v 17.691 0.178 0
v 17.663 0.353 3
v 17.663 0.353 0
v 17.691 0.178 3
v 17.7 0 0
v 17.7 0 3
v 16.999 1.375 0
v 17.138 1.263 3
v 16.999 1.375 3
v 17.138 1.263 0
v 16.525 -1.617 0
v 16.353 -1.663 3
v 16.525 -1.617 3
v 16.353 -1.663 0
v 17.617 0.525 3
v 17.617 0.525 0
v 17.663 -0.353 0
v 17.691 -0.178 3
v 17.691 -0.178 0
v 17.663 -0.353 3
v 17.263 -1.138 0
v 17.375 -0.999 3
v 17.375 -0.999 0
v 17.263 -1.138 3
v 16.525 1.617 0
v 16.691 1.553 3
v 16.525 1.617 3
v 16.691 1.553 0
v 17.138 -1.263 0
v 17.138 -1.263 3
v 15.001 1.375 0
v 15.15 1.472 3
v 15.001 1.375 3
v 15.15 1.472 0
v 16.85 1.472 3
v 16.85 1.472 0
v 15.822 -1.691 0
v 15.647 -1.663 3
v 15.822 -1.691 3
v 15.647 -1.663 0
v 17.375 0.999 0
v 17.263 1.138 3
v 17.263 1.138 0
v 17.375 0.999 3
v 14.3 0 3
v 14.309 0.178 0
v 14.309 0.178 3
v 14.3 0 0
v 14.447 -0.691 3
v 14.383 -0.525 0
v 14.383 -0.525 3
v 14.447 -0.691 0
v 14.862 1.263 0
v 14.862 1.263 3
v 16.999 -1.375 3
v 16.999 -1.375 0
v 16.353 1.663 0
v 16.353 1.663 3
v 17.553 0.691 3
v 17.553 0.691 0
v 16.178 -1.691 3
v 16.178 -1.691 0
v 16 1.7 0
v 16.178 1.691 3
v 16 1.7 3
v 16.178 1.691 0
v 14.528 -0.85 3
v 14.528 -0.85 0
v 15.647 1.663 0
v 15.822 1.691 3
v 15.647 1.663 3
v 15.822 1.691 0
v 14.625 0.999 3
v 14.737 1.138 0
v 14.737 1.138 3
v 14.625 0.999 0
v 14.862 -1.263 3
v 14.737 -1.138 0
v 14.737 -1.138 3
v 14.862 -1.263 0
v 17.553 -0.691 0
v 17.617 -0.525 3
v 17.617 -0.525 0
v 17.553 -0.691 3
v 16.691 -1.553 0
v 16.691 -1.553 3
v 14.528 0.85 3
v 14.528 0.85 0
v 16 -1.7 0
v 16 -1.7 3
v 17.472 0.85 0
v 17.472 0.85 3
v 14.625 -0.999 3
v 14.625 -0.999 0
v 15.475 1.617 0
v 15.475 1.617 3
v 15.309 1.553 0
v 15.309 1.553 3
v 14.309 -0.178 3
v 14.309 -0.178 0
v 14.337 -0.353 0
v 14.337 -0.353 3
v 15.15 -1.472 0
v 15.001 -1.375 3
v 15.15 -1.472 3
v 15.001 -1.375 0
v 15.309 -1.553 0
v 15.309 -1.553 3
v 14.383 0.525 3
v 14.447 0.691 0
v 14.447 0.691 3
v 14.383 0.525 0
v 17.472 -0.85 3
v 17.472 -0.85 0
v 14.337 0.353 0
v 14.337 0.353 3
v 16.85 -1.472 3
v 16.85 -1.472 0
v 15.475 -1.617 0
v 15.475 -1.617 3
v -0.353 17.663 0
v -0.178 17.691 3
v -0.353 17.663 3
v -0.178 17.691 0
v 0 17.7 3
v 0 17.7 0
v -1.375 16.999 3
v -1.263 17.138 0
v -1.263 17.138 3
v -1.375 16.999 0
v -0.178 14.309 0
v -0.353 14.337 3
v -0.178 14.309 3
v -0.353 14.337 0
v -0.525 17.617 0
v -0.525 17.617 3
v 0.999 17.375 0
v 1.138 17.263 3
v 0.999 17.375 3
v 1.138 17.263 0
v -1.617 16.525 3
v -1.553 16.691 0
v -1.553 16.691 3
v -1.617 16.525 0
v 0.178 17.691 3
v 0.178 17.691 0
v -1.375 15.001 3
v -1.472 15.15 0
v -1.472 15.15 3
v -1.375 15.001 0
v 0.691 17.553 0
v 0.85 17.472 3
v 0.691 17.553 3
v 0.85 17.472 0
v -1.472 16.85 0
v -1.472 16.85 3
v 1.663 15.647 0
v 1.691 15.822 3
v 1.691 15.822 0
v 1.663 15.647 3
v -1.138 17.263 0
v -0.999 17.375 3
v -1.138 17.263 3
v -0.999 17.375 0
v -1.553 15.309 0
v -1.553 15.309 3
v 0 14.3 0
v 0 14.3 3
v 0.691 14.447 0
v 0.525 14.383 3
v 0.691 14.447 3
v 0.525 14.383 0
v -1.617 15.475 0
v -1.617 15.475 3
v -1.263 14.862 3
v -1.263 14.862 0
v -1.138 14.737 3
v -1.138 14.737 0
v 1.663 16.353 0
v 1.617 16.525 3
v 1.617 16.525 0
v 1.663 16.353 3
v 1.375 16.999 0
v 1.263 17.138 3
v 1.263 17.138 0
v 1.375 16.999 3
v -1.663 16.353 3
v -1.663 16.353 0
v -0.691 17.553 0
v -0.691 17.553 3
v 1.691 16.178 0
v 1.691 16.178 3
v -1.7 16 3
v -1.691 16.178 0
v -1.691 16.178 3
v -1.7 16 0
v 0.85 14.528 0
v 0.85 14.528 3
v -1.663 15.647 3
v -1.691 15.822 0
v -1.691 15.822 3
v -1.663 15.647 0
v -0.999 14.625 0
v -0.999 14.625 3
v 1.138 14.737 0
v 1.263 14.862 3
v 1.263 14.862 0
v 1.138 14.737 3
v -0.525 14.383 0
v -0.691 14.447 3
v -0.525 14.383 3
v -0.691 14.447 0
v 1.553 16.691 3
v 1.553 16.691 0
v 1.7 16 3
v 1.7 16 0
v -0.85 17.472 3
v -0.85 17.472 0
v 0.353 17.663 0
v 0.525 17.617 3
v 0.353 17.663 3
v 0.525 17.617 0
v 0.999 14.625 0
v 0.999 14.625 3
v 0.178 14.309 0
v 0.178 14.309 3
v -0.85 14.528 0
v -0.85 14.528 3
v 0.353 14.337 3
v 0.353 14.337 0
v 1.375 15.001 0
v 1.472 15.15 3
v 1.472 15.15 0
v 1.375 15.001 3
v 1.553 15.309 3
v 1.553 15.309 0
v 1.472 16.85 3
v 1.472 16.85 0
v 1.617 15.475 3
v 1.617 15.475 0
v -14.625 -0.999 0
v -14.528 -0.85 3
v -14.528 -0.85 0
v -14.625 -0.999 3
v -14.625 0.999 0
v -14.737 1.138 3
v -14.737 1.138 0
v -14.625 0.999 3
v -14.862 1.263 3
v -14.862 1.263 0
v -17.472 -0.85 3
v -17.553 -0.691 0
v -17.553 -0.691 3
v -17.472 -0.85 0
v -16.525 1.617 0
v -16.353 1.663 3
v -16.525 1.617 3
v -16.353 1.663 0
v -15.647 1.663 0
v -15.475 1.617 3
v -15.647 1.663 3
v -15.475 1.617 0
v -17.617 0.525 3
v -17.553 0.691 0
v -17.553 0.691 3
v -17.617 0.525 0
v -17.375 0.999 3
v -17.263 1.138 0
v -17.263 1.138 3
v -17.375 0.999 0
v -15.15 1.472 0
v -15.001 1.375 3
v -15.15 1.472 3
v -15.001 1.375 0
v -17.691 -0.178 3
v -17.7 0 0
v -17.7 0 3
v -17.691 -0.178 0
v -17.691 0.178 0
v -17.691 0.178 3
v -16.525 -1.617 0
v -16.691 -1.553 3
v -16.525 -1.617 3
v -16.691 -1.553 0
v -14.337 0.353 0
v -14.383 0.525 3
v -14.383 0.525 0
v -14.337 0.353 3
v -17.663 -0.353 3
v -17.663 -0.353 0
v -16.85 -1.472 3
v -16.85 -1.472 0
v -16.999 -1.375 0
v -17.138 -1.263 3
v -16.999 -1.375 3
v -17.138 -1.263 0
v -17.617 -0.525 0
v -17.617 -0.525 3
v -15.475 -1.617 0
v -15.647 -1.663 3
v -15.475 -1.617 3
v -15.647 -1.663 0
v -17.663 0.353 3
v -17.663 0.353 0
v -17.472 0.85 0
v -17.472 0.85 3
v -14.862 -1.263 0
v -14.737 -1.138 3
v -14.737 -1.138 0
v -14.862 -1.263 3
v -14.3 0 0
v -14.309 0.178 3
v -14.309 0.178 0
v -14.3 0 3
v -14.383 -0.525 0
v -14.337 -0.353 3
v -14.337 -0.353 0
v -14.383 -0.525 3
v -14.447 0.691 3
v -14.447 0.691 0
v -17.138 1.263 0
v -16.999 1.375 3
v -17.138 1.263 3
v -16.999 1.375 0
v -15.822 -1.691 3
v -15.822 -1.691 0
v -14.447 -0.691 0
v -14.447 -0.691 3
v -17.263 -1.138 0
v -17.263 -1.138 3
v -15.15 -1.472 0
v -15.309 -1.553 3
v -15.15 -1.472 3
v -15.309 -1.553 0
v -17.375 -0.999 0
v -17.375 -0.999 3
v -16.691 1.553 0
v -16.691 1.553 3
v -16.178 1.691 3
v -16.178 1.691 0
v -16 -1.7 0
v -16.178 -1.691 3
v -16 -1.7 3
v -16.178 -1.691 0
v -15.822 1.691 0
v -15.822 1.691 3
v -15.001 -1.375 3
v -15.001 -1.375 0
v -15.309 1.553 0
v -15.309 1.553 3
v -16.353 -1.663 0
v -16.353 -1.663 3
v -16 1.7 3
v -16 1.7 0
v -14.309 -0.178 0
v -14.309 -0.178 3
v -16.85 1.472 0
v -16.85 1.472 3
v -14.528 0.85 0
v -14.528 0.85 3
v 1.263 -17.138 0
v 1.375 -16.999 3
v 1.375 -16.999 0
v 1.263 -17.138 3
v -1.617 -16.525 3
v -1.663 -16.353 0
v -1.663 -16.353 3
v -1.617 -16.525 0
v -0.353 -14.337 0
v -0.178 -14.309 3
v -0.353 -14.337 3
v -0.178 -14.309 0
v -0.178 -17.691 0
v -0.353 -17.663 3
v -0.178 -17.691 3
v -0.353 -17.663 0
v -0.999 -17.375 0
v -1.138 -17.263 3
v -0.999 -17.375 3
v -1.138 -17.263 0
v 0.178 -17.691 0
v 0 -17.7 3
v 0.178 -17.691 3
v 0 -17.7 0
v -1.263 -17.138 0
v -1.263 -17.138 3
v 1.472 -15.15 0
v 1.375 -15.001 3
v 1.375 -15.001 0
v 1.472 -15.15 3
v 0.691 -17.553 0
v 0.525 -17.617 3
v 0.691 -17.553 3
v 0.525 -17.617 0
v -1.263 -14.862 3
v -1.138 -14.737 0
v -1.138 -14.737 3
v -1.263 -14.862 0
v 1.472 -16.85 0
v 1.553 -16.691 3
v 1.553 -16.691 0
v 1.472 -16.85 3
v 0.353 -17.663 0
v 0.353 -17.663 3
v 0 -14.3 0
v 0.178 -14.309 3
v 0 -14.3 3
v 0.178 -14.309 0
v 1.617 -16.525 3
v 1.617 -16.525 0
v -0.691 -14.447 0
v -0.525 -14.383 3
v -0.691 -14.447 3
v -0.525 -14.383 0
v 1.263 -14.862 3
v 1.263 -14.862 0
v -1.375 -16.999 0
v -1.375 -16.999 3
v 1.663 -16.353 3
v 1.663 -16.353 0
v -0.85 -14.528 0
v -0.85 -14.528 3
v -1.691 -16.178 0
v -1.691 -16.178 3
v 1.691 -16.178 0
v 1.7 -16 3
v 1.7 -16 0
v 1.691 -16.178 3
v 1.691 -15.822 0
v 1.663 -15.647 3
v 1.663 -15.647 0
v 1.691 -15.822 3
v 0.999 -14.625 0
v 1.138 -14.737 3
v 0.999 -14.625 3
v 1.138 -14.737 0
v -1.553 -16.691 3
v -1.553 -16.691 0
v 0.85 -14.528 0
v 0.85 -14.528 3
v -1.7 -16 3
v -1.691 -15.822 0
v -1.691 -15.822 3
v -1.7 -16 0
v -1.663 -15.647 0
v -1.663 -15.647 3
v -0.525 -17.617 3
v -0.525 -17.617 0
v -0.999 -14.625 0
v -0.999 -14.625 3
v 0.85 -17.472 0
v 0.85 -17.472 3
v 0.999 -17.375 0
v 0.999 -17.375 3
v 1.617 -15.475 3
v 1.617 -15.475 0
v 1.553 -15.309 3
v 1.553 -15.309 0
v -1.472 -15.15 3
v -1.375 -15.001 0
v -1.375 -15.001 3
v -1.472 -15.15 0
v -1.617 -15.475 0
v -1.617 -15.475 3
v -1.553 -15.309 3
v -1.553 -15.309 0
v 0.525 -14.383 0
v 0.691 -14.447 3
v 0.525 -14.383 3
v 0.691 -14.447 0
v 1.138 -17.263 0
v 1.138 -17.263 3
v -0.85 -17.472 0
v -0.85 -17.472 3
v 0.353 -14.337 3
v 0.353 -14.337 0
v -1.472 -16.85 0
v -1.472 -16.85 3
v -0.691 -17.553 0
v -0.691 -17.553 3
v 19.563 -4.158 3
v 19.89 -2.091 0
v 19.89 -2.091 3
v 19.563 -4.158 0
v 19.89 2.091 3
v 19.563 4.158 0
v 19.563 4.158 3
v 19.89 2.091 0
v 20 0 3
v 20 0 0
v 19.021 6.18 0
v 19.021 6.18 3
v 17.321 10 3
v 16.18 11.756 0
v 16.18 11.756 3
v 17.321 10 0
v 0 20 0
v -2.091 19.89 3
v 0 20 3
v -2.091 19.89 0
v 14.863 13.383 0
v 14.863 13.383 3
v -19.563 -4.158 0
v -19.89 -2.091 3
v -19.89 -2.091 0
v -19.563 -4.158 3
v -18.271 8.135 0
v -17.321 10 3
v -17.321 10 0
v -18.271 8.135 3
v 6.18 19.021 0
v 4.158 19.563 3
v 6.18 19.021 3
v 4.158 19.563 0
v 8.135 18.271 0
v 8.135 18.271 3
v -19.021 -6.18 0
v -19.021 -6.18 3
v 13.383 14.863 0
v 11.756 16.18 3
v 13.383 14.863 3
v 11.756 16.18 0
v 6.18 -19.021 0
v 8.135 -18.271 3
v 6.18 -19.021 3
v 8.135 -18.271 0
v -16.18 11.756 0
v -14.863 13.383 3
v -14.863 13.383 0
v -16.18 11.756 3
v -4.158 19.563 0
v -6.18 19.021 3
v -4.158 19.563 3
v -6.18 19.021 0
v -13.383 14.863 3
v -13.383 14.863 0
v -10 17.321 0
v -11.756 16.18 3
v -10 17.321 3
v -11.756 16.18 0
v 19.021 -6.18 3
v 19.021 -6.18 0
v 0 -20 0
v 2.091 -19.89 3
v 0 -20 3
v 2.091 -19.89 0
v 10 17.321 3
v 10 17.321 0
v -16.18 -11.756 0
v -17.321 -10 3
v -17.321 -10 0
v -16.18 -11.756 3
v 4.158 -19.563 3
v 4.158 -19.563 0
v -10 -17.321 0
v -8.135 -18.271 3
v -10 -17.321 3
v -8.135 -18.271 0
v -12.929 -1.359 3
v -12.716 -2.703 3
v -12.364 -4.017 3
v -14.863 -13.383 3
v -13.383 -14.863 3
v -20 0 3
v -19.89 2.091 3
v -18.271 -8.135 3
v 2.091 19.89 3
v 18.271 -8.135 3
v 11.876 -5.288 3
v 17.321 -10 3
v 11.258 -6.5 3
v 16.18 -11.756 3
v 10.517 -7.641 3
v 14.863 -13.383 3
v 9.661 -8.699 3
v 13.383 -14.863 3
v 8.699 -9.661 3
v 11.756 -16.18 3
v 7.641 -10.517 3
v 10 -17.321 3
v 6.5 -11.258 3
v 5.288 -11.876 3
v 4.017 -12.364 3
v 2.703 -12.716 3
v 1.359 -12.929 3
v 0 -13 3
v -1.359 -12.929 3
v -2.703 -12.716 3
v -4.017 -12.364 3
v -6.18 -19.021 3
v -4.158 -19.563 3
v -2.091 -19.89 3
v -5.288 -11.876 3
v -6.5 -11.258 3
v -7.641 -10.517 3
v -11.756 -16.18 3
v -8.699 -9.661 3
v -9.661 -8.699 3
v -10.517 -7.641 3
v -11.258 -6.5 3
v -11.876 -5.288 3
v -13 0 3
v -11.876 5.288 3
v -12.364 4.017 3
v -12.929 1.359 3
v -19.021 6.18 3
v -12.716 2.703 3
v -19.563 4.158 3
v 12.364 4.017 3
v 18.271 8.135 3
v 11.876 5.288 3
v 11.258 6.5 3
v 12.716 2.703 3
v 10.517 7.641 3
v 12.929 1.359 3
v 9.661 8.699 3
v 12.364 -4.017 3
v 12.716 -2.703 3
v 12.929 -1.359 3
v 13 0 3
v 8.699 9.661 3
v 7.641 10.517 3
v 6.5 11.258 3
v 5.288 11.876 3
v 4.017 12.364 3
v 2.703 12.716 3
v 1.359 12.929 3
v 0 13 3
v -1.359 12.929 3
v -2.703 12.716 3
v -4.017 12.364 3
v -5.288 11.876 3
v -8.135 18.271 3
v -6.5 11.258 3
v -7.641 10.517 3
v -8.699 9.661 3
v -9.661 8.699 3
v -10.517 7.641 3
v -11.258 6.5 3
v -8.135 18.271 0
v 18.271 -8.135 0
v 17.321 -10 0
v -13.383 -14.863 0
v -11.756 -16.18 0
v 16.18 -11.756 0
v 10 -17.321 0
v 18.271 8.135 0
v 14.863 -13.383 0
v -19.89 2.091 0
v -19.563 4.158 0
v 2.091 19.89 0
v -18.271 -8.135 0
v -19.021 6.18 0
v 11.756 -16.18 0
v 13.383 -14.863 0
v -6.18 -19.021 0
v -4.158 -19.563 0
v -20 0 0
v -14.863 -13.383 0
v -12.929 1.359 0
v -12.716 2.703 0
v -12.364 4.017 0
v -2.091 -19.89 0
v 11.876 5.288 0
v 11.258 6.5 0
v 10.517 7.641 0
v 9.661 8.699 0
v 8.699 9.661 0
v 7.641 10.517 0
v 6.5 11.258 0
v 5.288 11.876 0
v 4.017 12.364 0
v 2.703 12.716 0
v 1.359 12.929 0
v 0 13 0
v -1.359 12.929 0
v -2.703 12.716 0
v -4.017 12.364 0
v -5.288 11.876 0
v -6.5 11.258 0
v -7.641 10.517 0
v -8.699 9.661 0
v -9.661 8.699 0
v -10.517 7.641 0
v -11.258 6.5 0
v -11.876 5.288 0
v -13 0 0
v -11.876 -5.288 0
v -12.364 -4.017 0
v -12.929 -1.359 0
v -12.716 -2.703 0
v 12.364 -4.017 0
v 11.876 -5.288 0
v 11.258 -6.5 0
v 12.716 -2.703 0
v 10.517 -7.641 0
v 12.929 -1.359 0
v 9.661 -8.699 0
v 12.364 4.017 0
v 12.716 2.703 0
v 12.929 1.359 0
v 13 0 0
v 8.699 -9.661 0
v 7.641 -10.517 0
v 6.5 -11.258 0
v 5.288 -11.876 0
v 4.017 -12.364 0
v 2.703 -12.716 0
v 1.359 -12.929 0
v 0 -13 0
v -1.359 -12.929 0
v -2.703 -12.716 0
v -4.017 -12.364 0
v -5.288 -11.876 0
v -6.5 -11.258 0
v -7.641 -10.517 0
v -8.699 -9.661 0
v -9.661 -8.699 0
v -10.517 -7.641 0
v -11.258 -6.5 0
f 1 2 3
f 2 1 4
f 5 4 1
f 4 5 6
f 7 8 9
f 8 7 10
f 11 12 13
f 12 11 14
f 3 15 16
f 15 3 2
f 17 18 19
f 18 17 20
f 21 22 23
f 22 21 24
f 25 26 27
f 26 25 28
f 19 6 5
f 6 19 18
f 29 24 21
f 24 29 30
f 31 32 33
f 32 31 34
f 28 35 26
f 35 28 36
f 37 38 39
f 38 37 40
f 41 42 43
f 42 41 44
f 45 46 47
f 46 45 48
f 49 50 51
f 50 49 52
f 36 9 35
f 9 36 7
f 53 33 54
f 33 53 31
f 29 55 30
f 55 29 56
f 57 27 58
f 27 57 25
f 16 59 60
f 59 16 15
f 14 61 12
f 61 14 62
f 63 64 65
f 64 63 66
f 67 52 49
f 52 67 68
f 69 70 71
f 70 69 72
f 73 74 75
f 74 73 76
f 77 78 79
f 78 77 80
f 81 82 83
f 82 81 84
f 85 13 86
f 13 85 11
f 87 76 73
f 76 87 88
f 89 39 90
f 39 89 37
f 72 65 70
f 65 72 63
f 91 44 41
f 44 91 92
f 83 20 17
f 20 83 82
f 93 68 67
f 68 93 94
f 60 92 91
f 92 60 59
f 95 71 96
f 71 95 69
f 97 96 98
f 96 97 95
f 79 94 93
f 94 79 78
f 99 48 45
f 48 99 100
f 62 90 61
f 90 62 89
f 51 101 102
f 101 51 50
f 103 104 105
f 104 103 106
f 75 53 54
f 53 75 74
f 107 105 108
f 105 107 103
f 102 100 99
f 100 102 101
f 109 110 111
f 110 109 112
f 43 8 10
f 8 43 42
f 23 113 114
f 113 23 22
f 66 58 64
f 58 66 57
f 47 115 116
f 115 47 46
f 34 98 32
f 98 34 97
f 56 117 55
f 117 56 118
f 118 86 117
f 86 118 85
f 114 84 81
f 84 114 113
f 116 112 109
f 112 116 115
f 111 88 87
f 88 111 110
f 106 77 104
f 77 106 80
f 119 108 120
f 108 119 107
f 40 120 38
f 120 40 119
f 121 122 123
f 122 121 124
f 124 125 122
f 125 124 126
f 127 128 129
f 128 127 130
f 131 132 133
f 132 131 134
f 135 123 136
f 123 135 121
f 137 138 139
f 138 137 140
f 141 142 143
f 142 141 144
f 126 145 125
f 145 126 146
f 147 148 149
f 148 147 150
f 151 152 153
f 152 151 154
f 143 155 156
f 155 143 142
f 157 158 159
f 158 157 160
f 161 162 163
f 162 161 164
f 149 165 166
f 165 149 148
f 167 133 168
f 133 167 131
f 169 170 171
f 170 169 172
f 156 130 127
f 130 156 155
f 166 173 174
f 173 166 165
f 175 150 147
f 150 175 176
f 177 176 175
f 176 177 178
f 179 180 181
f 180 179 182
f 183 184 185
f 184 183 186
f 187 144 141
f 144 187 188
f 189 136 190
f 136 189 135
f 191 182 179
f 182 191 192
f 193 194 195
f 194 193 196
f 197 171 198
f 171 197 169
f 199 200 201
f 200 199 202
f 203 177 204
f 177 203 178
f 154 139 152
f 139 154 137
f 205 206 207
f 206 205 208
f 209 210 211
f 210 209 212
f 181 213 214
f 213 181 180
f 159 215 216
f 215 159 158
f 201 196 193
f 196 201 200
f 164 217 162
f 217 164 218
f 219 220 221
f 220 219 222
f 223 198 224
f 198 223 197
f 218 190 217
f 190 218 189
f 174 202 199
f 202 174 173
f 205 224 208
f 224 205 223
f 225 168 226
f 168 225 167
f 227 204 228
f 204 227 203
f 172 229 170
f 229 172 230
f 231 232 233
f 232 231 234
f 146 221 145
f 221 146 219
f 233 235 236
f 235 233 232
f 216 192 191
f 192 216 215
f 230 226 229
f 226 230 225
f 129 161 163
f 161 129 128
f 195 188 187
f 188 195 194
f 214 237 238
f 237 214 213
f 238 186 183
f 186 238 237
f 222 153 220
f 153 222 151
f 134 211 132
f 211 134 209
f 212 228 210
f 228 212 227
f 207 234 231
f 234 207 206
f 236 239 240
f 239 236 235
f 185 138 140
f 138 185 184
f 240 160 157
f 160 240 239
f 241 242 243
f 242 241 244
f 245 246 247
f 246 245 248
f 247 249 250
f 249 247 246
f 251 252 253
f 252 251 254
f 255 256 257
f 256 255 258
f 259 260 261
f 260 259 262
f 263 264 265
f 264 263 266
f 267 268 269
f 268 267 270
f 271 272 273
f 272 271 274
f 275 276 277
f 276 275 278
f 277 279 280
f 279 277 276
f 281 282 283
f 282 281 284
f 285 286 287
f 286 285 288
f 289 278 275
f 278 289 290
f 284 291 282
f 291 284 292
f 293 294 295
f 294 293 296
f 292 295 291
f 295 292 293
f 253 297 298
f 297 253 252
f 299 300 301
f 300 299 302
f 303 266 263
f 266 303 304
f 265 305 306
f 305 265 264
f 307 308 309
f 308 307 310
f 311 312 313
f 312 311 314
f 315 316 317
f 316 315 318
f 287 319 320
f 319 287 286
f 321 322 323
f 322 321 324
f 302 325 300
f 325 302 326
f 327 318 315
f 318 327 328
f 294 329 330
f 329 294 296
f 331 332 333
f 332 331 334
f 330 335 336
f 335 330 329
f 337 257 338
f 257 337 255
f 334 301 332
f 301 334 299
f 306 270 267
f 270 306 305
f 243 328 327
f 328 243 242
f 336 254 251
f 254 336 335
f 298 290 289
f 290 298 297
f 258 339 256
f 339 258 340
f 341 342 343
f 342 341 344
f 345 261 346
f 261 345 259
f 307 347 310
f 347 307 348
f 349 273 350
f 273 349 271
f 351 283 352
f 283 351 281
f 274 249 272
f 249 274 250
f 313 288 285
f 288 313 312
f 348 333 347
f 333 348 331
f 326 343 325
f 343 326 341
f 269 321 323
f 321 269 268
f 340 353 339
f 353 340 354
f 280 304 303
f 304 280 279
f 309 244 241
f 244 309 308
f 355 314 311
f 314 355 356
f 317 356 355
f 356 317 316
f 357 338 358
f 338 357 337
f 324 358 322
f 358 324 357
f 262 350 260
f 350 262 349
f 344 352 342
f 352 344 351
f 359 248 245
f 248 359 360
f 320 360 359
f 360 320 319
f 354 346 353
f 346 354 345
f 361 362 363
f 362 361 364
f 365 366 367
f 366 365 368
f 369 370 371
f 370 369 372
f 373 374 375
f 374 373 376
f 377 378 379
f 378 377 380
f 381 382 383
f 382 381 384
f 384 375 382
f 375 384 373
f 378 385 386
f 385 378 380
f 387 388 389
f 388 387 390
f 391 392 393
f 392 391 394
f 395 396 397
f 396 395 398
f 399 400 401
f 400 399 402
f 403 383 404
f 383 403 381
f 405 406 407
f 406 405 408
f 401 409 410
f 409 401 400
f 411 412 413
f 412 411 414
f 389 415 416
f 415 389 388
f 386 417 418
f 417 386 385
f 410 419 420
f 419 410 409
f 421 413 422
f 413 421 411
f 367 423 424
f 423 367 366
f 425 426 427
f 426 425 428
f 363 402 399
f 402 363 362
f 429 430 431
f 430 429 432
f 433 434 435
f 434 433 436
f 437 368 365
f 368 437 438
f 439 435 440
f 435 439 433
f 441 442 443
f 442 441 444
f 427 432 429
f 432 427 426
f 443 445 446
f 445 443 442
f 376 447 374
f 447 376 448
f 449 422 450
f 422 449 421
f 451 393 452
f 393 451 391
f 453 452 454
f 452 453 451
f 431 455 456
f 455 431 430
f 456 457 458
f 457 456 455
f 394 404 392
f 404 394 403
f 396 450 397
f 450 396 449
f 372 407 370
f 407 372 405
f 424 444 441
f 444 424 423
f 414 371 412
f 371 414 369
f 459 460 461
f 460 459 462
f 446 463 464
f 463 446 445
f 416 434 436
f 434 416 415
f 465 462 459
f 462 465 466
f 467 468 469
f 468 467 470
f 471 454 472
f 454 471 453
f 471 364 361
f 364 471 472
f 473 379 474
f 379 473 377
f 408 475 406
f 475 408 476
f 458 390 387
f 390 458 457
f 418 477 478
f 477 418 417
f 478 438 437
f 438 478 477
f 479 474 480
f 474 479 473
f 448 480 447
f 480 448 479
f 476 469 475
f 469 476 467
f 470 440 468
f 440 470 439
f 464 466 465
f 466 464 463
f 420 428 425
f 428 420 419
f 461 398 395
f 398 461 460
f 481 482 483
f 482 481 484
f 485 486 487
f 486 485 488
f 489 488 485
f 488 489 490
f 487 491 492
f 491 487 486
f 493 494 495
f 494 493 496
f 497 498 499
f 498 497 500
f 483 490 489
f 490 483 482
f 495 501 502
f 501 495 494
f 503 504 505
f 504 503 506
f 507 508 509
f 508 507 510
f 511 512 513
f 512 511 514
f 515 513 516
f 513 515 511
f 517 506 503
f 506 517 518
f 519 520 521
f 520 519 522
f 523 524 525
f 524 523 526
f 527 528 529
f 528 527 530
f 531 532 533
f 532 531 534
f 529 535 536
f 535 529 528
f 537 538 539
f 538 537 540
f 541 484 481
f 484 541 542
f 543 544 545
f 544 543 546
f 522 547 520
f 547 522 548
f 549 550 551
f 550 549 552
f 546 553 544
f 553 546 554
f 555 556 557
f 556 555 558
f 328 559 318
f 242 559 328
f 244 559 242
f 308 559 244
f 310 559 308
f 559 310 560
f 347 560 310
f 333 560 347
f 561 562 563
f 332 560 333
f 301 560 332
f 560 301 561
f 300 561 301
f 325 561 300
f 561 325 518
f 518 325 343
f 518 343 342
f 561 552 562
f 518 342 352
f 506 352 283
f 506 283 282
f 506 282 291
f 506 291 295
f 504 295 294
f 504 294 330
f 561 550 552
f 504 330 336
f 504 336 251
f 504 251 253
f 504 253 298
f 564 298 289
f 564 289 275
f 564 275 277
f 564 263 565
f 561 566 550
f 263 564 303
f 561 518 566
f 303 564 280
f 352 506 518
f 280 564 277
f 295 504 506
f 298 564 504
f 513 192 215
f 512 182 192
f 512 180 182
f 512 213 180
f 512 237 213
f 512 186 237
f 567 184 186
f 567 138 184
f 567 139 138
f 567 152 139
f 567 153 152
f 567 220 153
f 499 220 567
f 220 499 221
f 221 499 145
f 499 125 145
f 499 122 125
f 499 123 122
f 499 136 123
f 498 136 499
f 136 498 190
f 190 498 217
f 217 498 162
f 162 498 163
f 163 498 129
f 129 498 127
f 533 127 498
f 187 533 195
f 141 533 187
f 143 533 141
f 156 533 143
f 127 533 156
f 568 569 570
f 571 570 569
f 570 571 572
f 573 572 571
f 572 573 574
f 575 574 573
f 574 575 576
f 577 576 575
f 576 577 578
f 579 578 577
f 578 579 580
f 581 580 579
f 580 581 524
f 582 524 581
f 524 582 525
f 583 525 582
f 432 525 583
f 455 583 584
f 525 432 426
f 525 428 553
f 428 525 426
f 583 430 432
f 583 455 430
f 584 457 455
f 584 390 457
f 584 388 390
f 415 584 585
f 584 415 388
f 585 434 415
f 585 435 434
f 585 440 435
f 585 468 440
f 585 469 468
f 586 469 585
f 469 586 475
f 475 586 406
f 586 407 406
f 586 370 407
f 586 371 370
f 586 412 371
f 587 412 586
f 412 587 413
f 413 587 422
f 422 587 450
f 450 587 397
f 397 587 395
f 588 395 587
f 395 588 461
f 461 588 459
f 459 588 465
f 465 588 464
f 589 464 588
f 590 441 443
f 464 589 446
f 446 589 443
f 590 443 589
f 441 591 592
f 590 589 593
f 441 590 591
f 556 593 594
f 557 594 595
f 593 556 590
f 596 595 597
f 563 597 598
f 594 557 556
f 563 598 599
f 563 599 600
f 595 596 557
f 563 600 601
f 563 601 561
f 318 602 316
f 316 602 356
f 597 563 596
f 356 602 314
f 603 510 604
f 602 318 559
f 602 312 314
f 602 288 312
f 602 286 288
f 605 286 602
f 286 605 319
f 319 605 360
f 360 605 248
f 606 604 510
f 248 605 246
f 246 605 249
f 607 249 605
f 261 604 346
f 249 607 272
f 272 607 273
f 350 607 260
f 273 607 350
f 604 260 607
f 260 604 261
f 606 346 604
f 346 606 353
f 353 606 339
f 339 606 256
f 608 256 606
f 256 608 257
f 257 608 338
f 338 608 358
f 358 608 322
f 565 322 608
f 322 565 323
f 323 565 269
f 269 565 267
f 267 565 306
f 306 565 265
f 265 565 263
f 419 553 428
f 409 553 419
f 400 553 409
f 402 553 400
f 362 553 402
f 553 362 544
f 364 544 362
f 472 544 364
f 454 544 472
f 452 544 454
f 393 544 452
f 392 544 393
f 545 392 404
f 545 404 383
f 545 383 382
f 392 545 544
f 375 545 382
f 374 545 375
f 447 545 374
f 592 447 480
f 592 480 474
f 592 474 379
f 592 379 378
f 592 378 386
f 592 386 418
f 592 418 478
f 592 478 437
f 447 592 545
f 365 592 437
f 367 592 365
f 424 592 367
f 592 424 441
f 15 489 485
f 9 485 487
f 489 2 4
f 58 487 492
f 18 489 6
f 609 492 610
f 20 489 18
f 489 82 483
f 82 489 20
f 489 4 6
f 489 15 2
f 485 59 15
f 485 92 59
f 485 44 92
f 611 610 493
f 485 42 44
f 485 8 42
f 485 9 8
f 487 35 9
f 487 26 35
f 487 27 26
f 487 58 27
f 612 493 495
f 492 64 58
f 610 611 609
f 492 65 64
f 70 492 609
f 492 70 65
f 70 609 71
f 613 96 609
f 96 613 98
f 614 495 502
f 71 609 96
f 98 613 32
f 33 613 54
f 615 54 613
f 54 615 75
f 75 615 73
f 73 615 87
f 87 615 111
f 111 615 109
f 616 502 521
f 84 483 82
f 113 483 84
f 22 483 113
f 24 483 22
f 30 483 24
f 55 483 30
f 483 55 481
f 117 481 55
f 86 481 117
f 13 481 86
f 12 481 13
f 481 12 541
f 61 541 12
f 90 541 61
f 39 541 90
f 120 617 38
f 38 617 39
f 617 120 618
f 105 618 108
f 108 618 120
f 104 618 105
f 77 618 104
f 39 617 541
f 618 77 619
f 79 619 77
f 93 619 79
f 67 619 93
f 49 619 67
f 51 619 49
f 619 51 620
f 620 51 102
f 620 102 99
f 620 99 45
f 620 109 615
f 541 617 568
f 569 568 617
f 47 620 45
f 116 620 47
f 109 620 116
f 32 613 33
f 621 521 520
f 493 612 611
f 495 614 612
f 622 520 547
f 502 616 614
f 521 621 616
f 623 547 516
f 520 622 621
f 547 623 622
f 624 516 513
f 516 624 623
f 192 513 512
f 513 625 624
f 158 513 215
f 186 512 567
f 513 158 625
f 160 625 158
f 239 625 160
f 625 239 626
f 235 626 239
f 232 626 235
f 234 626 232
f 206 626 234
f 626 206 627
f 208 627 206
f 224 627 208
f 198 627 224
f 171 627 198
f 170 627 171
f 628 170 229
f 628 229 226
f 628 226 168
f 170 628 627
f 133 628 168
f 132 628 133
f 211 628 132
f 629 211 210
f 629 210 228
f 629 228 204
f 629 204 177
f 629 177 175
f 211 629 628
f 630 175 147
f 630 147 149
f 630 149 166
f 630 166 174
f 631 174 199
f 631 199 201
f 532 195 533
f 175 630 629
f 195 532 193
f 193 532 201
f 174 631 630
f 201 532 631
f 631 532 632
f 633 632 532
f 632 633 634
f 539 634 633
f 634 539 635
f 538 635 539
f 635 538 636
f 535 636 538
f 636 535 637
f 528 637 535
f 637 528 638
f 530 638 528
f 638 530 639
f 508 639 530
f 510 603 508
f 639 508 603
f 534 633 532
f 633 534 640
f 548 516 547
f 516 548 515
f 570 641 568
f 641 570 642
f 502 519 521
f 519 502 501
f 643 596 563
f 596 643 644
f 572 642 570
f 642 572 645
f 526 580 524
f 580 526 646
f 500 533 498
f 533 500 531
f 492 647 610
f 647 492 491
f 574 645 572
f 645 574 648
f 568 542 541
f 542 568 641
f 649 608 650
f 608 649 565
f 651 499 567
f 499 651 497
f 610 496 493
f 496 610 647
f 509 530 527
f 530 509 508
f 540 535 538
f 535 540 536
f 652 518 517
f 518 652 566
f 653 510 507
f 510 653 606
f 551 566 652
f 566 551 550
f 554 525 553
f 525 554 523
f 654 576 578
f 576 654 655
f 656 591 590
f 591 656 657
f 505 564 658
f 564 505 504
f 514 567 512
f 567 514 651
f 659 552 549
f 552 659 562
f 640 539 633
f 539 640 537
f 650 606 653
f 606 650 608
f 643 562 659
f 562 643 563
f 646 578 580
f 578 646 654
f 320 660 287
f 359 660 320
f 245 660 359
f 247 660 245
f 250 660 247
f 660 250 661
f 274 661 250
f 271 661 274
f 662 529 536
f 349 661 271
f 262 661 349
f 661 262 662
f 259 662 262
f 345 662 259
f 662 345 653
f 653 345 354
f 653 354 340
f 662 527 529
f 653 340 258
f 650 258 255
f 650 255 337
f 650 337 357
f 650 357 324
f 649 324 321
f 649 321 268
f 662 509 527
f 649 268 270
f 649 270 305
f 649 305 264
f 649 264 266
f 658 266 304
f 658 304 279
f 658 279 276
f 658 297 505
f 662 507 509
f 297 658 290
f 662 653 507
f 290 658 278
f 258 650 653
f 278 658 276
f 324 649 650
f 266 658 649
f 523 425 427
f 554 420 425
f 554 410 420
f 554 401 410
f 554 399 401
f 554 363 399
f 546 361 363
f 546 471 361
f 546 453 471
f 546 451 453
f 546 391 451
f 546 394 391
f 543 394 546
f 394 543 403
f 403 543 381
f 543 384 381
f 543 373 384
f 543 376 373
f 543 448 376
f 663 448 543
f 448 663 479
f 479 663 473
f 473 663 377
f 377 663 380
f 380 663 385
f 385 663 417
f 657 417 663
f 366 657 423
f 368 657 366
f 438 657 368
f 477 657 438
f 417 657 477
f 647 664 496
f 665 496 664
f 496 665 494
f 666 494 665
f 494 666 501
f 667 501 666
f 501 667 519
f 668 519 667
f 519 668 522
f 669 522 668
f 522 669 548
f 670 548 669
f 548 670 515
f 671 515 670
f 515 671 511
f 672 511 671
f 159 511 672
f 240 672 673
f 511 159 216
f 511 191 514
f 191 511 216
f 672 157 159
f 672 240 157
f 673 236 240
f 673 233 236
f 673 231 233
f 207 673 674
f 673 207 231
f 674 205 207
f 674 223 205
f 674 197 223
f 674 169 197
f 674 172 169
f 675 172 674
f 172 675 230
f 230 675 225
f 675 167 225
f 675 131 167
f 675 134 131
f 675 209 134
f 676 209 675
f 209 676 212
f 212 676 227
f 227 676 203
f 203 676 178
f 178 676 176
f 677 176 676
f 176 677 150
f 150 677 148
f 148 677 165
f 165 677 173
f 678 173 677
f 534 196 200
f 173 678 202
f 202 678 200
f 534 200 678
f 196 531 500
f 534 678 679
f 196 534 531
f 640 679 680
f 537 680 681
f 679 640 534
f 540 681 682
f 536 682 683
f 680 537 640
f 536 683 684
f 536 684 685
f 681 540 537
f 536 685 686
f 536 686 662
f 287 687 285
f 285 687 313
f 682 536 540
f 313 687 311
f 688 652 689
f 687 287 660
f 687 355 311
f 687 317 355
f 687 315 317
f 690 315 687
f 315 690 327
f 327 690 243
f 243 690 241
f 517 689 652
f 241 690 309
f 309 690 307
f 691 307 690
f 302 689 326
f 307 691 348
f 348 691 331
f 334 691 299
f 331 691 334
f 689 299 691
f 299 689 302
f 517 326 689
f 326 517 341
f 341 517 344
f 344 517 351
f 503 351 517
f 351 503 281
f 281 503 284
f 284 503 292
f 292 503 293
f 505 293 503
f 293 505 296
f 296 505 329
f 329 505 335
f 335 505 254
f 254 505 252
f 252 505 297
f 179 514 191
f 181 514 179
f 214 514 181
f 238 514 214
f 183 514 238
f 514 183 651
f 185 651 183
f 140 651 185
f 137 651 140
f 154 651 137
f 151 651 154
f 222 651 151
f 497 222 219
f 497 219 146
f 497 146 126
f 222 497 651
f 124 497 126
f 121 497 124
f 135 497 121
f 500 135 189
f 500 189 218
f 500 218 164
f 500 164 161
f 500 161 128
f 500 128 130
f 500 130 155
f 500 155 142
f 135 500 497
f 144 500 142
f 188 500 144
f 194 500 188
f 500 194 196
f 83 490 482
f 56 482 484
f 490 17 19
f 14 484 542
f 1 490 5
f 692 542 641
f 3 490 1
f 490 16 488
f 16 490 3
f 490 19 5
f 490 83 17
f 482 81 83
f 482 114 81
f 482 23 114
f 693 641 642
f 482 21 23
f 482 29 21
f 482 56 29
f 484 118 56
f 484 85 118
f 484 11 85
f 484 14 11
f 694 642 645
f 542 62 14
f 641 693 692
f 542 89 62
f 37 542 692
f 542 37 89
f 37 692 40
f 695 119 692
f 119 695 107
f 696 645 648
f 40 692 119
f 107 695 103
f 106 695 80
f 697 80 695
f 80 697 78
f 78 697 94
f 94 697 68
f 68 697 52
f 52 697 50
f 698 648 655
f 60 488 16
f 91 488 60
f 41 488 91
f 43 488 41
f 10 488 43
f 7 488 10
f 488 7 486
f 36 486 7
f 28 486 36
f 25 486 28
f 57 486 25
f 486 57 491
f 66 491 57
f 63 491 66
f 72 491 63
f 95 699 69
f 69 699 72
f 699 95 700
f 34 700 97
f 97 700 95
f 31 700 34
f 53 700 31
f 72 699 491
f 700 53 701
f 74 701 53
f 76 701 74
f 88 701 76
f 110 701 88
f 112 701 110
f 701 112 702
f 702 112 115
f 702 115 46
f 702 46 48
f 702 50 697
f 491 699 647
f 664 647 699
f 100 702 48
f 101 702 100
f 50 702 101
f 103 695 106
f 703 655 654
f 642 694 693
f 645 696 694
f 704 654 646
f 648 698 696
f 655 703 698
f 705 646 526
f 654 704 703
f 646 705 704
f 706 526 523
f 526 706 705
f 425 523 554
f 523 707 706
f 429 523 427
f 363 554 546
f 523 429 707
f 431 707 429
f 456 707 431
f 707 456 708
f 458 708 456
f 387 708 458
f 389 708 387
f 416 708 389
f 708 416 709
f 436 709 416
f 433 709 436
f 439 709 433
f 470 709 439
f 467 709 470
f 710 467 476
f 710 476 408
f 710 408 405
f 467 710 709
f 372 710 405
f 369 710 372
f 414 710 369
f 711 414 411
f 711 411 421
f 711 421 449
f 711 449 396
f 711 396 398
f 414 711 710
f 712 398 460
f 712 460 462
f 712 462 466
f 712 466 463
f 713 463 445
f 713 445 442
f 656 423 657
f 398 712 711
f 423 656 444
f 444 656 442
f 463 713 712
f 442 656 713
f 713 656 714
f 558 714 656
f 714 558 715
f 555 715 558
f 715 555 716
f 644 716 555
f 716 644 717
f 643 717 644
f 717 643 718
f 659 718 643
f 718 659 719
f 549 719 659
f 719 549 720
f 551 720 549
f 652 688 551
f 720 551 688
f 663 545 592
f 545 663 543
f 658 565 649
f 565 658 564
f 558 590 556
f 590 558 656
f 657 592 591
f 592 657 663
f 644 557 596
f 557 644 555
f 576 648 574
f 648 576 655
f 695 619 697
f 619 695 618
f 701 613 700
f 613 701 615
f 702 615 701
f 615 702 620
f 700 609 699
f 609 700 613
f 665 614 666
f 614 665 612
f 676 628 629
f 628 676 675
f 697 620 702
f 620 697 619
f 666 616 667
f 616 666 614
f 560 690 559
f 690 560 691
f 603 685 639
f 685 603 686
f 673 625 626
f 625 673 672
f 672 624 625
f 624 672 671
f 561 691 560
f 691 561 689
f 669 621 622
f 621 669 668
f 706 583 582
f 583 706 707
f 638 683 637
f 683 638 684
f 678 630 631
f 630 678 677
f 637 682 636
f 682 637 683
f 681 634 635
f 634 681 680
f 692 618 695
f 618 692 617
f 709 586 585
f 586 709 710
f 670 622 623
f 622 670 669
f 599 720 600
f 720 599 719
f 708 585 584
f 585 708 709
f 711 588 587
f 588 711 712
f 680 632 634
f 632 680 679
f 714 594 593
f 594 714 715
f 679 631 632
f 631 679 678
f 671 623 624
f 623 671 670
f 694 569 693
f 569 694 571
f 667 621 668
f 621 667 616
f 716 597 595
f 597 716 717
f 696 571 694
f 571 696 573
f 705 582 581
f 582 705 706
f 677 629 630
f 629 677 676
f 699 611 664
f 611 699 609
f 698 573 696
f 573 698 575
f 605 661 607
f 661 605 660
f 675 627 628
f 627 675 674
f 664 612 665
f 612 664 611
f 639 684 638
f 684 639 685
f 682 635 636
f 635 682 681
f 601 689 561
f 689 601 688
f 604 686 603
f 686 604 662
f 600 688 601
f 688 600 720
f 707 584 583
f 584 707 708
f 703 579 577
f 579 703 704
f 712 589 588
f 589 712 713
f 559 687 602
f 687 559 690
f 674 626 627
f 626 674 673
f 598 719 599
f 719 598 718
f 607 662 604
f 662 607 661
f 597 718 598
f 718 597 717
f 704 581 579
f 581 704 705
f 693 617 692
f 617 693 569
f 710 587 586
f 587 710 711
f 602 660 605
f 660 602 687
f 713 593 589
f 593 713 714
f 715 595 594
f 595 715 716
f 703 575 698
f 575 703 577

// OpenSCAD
// Bearing retaining ring.
$fn = 60;
eps = 0.02;
bearing_d = 26;
outer_d = 40;
thickness = 3;
difference() {
    cylinder(d=outer_d,h=thickness);
    translate([0,0,-eps]) cylinder(d=bearing_d,h=thickness+2*eps);
    for (i=[0:3]) rotate([0,0,i*90]) translate([outer_d/2-4,0,-eps]) cylinder(d=3.4,h=thickness+2*eps);
}
